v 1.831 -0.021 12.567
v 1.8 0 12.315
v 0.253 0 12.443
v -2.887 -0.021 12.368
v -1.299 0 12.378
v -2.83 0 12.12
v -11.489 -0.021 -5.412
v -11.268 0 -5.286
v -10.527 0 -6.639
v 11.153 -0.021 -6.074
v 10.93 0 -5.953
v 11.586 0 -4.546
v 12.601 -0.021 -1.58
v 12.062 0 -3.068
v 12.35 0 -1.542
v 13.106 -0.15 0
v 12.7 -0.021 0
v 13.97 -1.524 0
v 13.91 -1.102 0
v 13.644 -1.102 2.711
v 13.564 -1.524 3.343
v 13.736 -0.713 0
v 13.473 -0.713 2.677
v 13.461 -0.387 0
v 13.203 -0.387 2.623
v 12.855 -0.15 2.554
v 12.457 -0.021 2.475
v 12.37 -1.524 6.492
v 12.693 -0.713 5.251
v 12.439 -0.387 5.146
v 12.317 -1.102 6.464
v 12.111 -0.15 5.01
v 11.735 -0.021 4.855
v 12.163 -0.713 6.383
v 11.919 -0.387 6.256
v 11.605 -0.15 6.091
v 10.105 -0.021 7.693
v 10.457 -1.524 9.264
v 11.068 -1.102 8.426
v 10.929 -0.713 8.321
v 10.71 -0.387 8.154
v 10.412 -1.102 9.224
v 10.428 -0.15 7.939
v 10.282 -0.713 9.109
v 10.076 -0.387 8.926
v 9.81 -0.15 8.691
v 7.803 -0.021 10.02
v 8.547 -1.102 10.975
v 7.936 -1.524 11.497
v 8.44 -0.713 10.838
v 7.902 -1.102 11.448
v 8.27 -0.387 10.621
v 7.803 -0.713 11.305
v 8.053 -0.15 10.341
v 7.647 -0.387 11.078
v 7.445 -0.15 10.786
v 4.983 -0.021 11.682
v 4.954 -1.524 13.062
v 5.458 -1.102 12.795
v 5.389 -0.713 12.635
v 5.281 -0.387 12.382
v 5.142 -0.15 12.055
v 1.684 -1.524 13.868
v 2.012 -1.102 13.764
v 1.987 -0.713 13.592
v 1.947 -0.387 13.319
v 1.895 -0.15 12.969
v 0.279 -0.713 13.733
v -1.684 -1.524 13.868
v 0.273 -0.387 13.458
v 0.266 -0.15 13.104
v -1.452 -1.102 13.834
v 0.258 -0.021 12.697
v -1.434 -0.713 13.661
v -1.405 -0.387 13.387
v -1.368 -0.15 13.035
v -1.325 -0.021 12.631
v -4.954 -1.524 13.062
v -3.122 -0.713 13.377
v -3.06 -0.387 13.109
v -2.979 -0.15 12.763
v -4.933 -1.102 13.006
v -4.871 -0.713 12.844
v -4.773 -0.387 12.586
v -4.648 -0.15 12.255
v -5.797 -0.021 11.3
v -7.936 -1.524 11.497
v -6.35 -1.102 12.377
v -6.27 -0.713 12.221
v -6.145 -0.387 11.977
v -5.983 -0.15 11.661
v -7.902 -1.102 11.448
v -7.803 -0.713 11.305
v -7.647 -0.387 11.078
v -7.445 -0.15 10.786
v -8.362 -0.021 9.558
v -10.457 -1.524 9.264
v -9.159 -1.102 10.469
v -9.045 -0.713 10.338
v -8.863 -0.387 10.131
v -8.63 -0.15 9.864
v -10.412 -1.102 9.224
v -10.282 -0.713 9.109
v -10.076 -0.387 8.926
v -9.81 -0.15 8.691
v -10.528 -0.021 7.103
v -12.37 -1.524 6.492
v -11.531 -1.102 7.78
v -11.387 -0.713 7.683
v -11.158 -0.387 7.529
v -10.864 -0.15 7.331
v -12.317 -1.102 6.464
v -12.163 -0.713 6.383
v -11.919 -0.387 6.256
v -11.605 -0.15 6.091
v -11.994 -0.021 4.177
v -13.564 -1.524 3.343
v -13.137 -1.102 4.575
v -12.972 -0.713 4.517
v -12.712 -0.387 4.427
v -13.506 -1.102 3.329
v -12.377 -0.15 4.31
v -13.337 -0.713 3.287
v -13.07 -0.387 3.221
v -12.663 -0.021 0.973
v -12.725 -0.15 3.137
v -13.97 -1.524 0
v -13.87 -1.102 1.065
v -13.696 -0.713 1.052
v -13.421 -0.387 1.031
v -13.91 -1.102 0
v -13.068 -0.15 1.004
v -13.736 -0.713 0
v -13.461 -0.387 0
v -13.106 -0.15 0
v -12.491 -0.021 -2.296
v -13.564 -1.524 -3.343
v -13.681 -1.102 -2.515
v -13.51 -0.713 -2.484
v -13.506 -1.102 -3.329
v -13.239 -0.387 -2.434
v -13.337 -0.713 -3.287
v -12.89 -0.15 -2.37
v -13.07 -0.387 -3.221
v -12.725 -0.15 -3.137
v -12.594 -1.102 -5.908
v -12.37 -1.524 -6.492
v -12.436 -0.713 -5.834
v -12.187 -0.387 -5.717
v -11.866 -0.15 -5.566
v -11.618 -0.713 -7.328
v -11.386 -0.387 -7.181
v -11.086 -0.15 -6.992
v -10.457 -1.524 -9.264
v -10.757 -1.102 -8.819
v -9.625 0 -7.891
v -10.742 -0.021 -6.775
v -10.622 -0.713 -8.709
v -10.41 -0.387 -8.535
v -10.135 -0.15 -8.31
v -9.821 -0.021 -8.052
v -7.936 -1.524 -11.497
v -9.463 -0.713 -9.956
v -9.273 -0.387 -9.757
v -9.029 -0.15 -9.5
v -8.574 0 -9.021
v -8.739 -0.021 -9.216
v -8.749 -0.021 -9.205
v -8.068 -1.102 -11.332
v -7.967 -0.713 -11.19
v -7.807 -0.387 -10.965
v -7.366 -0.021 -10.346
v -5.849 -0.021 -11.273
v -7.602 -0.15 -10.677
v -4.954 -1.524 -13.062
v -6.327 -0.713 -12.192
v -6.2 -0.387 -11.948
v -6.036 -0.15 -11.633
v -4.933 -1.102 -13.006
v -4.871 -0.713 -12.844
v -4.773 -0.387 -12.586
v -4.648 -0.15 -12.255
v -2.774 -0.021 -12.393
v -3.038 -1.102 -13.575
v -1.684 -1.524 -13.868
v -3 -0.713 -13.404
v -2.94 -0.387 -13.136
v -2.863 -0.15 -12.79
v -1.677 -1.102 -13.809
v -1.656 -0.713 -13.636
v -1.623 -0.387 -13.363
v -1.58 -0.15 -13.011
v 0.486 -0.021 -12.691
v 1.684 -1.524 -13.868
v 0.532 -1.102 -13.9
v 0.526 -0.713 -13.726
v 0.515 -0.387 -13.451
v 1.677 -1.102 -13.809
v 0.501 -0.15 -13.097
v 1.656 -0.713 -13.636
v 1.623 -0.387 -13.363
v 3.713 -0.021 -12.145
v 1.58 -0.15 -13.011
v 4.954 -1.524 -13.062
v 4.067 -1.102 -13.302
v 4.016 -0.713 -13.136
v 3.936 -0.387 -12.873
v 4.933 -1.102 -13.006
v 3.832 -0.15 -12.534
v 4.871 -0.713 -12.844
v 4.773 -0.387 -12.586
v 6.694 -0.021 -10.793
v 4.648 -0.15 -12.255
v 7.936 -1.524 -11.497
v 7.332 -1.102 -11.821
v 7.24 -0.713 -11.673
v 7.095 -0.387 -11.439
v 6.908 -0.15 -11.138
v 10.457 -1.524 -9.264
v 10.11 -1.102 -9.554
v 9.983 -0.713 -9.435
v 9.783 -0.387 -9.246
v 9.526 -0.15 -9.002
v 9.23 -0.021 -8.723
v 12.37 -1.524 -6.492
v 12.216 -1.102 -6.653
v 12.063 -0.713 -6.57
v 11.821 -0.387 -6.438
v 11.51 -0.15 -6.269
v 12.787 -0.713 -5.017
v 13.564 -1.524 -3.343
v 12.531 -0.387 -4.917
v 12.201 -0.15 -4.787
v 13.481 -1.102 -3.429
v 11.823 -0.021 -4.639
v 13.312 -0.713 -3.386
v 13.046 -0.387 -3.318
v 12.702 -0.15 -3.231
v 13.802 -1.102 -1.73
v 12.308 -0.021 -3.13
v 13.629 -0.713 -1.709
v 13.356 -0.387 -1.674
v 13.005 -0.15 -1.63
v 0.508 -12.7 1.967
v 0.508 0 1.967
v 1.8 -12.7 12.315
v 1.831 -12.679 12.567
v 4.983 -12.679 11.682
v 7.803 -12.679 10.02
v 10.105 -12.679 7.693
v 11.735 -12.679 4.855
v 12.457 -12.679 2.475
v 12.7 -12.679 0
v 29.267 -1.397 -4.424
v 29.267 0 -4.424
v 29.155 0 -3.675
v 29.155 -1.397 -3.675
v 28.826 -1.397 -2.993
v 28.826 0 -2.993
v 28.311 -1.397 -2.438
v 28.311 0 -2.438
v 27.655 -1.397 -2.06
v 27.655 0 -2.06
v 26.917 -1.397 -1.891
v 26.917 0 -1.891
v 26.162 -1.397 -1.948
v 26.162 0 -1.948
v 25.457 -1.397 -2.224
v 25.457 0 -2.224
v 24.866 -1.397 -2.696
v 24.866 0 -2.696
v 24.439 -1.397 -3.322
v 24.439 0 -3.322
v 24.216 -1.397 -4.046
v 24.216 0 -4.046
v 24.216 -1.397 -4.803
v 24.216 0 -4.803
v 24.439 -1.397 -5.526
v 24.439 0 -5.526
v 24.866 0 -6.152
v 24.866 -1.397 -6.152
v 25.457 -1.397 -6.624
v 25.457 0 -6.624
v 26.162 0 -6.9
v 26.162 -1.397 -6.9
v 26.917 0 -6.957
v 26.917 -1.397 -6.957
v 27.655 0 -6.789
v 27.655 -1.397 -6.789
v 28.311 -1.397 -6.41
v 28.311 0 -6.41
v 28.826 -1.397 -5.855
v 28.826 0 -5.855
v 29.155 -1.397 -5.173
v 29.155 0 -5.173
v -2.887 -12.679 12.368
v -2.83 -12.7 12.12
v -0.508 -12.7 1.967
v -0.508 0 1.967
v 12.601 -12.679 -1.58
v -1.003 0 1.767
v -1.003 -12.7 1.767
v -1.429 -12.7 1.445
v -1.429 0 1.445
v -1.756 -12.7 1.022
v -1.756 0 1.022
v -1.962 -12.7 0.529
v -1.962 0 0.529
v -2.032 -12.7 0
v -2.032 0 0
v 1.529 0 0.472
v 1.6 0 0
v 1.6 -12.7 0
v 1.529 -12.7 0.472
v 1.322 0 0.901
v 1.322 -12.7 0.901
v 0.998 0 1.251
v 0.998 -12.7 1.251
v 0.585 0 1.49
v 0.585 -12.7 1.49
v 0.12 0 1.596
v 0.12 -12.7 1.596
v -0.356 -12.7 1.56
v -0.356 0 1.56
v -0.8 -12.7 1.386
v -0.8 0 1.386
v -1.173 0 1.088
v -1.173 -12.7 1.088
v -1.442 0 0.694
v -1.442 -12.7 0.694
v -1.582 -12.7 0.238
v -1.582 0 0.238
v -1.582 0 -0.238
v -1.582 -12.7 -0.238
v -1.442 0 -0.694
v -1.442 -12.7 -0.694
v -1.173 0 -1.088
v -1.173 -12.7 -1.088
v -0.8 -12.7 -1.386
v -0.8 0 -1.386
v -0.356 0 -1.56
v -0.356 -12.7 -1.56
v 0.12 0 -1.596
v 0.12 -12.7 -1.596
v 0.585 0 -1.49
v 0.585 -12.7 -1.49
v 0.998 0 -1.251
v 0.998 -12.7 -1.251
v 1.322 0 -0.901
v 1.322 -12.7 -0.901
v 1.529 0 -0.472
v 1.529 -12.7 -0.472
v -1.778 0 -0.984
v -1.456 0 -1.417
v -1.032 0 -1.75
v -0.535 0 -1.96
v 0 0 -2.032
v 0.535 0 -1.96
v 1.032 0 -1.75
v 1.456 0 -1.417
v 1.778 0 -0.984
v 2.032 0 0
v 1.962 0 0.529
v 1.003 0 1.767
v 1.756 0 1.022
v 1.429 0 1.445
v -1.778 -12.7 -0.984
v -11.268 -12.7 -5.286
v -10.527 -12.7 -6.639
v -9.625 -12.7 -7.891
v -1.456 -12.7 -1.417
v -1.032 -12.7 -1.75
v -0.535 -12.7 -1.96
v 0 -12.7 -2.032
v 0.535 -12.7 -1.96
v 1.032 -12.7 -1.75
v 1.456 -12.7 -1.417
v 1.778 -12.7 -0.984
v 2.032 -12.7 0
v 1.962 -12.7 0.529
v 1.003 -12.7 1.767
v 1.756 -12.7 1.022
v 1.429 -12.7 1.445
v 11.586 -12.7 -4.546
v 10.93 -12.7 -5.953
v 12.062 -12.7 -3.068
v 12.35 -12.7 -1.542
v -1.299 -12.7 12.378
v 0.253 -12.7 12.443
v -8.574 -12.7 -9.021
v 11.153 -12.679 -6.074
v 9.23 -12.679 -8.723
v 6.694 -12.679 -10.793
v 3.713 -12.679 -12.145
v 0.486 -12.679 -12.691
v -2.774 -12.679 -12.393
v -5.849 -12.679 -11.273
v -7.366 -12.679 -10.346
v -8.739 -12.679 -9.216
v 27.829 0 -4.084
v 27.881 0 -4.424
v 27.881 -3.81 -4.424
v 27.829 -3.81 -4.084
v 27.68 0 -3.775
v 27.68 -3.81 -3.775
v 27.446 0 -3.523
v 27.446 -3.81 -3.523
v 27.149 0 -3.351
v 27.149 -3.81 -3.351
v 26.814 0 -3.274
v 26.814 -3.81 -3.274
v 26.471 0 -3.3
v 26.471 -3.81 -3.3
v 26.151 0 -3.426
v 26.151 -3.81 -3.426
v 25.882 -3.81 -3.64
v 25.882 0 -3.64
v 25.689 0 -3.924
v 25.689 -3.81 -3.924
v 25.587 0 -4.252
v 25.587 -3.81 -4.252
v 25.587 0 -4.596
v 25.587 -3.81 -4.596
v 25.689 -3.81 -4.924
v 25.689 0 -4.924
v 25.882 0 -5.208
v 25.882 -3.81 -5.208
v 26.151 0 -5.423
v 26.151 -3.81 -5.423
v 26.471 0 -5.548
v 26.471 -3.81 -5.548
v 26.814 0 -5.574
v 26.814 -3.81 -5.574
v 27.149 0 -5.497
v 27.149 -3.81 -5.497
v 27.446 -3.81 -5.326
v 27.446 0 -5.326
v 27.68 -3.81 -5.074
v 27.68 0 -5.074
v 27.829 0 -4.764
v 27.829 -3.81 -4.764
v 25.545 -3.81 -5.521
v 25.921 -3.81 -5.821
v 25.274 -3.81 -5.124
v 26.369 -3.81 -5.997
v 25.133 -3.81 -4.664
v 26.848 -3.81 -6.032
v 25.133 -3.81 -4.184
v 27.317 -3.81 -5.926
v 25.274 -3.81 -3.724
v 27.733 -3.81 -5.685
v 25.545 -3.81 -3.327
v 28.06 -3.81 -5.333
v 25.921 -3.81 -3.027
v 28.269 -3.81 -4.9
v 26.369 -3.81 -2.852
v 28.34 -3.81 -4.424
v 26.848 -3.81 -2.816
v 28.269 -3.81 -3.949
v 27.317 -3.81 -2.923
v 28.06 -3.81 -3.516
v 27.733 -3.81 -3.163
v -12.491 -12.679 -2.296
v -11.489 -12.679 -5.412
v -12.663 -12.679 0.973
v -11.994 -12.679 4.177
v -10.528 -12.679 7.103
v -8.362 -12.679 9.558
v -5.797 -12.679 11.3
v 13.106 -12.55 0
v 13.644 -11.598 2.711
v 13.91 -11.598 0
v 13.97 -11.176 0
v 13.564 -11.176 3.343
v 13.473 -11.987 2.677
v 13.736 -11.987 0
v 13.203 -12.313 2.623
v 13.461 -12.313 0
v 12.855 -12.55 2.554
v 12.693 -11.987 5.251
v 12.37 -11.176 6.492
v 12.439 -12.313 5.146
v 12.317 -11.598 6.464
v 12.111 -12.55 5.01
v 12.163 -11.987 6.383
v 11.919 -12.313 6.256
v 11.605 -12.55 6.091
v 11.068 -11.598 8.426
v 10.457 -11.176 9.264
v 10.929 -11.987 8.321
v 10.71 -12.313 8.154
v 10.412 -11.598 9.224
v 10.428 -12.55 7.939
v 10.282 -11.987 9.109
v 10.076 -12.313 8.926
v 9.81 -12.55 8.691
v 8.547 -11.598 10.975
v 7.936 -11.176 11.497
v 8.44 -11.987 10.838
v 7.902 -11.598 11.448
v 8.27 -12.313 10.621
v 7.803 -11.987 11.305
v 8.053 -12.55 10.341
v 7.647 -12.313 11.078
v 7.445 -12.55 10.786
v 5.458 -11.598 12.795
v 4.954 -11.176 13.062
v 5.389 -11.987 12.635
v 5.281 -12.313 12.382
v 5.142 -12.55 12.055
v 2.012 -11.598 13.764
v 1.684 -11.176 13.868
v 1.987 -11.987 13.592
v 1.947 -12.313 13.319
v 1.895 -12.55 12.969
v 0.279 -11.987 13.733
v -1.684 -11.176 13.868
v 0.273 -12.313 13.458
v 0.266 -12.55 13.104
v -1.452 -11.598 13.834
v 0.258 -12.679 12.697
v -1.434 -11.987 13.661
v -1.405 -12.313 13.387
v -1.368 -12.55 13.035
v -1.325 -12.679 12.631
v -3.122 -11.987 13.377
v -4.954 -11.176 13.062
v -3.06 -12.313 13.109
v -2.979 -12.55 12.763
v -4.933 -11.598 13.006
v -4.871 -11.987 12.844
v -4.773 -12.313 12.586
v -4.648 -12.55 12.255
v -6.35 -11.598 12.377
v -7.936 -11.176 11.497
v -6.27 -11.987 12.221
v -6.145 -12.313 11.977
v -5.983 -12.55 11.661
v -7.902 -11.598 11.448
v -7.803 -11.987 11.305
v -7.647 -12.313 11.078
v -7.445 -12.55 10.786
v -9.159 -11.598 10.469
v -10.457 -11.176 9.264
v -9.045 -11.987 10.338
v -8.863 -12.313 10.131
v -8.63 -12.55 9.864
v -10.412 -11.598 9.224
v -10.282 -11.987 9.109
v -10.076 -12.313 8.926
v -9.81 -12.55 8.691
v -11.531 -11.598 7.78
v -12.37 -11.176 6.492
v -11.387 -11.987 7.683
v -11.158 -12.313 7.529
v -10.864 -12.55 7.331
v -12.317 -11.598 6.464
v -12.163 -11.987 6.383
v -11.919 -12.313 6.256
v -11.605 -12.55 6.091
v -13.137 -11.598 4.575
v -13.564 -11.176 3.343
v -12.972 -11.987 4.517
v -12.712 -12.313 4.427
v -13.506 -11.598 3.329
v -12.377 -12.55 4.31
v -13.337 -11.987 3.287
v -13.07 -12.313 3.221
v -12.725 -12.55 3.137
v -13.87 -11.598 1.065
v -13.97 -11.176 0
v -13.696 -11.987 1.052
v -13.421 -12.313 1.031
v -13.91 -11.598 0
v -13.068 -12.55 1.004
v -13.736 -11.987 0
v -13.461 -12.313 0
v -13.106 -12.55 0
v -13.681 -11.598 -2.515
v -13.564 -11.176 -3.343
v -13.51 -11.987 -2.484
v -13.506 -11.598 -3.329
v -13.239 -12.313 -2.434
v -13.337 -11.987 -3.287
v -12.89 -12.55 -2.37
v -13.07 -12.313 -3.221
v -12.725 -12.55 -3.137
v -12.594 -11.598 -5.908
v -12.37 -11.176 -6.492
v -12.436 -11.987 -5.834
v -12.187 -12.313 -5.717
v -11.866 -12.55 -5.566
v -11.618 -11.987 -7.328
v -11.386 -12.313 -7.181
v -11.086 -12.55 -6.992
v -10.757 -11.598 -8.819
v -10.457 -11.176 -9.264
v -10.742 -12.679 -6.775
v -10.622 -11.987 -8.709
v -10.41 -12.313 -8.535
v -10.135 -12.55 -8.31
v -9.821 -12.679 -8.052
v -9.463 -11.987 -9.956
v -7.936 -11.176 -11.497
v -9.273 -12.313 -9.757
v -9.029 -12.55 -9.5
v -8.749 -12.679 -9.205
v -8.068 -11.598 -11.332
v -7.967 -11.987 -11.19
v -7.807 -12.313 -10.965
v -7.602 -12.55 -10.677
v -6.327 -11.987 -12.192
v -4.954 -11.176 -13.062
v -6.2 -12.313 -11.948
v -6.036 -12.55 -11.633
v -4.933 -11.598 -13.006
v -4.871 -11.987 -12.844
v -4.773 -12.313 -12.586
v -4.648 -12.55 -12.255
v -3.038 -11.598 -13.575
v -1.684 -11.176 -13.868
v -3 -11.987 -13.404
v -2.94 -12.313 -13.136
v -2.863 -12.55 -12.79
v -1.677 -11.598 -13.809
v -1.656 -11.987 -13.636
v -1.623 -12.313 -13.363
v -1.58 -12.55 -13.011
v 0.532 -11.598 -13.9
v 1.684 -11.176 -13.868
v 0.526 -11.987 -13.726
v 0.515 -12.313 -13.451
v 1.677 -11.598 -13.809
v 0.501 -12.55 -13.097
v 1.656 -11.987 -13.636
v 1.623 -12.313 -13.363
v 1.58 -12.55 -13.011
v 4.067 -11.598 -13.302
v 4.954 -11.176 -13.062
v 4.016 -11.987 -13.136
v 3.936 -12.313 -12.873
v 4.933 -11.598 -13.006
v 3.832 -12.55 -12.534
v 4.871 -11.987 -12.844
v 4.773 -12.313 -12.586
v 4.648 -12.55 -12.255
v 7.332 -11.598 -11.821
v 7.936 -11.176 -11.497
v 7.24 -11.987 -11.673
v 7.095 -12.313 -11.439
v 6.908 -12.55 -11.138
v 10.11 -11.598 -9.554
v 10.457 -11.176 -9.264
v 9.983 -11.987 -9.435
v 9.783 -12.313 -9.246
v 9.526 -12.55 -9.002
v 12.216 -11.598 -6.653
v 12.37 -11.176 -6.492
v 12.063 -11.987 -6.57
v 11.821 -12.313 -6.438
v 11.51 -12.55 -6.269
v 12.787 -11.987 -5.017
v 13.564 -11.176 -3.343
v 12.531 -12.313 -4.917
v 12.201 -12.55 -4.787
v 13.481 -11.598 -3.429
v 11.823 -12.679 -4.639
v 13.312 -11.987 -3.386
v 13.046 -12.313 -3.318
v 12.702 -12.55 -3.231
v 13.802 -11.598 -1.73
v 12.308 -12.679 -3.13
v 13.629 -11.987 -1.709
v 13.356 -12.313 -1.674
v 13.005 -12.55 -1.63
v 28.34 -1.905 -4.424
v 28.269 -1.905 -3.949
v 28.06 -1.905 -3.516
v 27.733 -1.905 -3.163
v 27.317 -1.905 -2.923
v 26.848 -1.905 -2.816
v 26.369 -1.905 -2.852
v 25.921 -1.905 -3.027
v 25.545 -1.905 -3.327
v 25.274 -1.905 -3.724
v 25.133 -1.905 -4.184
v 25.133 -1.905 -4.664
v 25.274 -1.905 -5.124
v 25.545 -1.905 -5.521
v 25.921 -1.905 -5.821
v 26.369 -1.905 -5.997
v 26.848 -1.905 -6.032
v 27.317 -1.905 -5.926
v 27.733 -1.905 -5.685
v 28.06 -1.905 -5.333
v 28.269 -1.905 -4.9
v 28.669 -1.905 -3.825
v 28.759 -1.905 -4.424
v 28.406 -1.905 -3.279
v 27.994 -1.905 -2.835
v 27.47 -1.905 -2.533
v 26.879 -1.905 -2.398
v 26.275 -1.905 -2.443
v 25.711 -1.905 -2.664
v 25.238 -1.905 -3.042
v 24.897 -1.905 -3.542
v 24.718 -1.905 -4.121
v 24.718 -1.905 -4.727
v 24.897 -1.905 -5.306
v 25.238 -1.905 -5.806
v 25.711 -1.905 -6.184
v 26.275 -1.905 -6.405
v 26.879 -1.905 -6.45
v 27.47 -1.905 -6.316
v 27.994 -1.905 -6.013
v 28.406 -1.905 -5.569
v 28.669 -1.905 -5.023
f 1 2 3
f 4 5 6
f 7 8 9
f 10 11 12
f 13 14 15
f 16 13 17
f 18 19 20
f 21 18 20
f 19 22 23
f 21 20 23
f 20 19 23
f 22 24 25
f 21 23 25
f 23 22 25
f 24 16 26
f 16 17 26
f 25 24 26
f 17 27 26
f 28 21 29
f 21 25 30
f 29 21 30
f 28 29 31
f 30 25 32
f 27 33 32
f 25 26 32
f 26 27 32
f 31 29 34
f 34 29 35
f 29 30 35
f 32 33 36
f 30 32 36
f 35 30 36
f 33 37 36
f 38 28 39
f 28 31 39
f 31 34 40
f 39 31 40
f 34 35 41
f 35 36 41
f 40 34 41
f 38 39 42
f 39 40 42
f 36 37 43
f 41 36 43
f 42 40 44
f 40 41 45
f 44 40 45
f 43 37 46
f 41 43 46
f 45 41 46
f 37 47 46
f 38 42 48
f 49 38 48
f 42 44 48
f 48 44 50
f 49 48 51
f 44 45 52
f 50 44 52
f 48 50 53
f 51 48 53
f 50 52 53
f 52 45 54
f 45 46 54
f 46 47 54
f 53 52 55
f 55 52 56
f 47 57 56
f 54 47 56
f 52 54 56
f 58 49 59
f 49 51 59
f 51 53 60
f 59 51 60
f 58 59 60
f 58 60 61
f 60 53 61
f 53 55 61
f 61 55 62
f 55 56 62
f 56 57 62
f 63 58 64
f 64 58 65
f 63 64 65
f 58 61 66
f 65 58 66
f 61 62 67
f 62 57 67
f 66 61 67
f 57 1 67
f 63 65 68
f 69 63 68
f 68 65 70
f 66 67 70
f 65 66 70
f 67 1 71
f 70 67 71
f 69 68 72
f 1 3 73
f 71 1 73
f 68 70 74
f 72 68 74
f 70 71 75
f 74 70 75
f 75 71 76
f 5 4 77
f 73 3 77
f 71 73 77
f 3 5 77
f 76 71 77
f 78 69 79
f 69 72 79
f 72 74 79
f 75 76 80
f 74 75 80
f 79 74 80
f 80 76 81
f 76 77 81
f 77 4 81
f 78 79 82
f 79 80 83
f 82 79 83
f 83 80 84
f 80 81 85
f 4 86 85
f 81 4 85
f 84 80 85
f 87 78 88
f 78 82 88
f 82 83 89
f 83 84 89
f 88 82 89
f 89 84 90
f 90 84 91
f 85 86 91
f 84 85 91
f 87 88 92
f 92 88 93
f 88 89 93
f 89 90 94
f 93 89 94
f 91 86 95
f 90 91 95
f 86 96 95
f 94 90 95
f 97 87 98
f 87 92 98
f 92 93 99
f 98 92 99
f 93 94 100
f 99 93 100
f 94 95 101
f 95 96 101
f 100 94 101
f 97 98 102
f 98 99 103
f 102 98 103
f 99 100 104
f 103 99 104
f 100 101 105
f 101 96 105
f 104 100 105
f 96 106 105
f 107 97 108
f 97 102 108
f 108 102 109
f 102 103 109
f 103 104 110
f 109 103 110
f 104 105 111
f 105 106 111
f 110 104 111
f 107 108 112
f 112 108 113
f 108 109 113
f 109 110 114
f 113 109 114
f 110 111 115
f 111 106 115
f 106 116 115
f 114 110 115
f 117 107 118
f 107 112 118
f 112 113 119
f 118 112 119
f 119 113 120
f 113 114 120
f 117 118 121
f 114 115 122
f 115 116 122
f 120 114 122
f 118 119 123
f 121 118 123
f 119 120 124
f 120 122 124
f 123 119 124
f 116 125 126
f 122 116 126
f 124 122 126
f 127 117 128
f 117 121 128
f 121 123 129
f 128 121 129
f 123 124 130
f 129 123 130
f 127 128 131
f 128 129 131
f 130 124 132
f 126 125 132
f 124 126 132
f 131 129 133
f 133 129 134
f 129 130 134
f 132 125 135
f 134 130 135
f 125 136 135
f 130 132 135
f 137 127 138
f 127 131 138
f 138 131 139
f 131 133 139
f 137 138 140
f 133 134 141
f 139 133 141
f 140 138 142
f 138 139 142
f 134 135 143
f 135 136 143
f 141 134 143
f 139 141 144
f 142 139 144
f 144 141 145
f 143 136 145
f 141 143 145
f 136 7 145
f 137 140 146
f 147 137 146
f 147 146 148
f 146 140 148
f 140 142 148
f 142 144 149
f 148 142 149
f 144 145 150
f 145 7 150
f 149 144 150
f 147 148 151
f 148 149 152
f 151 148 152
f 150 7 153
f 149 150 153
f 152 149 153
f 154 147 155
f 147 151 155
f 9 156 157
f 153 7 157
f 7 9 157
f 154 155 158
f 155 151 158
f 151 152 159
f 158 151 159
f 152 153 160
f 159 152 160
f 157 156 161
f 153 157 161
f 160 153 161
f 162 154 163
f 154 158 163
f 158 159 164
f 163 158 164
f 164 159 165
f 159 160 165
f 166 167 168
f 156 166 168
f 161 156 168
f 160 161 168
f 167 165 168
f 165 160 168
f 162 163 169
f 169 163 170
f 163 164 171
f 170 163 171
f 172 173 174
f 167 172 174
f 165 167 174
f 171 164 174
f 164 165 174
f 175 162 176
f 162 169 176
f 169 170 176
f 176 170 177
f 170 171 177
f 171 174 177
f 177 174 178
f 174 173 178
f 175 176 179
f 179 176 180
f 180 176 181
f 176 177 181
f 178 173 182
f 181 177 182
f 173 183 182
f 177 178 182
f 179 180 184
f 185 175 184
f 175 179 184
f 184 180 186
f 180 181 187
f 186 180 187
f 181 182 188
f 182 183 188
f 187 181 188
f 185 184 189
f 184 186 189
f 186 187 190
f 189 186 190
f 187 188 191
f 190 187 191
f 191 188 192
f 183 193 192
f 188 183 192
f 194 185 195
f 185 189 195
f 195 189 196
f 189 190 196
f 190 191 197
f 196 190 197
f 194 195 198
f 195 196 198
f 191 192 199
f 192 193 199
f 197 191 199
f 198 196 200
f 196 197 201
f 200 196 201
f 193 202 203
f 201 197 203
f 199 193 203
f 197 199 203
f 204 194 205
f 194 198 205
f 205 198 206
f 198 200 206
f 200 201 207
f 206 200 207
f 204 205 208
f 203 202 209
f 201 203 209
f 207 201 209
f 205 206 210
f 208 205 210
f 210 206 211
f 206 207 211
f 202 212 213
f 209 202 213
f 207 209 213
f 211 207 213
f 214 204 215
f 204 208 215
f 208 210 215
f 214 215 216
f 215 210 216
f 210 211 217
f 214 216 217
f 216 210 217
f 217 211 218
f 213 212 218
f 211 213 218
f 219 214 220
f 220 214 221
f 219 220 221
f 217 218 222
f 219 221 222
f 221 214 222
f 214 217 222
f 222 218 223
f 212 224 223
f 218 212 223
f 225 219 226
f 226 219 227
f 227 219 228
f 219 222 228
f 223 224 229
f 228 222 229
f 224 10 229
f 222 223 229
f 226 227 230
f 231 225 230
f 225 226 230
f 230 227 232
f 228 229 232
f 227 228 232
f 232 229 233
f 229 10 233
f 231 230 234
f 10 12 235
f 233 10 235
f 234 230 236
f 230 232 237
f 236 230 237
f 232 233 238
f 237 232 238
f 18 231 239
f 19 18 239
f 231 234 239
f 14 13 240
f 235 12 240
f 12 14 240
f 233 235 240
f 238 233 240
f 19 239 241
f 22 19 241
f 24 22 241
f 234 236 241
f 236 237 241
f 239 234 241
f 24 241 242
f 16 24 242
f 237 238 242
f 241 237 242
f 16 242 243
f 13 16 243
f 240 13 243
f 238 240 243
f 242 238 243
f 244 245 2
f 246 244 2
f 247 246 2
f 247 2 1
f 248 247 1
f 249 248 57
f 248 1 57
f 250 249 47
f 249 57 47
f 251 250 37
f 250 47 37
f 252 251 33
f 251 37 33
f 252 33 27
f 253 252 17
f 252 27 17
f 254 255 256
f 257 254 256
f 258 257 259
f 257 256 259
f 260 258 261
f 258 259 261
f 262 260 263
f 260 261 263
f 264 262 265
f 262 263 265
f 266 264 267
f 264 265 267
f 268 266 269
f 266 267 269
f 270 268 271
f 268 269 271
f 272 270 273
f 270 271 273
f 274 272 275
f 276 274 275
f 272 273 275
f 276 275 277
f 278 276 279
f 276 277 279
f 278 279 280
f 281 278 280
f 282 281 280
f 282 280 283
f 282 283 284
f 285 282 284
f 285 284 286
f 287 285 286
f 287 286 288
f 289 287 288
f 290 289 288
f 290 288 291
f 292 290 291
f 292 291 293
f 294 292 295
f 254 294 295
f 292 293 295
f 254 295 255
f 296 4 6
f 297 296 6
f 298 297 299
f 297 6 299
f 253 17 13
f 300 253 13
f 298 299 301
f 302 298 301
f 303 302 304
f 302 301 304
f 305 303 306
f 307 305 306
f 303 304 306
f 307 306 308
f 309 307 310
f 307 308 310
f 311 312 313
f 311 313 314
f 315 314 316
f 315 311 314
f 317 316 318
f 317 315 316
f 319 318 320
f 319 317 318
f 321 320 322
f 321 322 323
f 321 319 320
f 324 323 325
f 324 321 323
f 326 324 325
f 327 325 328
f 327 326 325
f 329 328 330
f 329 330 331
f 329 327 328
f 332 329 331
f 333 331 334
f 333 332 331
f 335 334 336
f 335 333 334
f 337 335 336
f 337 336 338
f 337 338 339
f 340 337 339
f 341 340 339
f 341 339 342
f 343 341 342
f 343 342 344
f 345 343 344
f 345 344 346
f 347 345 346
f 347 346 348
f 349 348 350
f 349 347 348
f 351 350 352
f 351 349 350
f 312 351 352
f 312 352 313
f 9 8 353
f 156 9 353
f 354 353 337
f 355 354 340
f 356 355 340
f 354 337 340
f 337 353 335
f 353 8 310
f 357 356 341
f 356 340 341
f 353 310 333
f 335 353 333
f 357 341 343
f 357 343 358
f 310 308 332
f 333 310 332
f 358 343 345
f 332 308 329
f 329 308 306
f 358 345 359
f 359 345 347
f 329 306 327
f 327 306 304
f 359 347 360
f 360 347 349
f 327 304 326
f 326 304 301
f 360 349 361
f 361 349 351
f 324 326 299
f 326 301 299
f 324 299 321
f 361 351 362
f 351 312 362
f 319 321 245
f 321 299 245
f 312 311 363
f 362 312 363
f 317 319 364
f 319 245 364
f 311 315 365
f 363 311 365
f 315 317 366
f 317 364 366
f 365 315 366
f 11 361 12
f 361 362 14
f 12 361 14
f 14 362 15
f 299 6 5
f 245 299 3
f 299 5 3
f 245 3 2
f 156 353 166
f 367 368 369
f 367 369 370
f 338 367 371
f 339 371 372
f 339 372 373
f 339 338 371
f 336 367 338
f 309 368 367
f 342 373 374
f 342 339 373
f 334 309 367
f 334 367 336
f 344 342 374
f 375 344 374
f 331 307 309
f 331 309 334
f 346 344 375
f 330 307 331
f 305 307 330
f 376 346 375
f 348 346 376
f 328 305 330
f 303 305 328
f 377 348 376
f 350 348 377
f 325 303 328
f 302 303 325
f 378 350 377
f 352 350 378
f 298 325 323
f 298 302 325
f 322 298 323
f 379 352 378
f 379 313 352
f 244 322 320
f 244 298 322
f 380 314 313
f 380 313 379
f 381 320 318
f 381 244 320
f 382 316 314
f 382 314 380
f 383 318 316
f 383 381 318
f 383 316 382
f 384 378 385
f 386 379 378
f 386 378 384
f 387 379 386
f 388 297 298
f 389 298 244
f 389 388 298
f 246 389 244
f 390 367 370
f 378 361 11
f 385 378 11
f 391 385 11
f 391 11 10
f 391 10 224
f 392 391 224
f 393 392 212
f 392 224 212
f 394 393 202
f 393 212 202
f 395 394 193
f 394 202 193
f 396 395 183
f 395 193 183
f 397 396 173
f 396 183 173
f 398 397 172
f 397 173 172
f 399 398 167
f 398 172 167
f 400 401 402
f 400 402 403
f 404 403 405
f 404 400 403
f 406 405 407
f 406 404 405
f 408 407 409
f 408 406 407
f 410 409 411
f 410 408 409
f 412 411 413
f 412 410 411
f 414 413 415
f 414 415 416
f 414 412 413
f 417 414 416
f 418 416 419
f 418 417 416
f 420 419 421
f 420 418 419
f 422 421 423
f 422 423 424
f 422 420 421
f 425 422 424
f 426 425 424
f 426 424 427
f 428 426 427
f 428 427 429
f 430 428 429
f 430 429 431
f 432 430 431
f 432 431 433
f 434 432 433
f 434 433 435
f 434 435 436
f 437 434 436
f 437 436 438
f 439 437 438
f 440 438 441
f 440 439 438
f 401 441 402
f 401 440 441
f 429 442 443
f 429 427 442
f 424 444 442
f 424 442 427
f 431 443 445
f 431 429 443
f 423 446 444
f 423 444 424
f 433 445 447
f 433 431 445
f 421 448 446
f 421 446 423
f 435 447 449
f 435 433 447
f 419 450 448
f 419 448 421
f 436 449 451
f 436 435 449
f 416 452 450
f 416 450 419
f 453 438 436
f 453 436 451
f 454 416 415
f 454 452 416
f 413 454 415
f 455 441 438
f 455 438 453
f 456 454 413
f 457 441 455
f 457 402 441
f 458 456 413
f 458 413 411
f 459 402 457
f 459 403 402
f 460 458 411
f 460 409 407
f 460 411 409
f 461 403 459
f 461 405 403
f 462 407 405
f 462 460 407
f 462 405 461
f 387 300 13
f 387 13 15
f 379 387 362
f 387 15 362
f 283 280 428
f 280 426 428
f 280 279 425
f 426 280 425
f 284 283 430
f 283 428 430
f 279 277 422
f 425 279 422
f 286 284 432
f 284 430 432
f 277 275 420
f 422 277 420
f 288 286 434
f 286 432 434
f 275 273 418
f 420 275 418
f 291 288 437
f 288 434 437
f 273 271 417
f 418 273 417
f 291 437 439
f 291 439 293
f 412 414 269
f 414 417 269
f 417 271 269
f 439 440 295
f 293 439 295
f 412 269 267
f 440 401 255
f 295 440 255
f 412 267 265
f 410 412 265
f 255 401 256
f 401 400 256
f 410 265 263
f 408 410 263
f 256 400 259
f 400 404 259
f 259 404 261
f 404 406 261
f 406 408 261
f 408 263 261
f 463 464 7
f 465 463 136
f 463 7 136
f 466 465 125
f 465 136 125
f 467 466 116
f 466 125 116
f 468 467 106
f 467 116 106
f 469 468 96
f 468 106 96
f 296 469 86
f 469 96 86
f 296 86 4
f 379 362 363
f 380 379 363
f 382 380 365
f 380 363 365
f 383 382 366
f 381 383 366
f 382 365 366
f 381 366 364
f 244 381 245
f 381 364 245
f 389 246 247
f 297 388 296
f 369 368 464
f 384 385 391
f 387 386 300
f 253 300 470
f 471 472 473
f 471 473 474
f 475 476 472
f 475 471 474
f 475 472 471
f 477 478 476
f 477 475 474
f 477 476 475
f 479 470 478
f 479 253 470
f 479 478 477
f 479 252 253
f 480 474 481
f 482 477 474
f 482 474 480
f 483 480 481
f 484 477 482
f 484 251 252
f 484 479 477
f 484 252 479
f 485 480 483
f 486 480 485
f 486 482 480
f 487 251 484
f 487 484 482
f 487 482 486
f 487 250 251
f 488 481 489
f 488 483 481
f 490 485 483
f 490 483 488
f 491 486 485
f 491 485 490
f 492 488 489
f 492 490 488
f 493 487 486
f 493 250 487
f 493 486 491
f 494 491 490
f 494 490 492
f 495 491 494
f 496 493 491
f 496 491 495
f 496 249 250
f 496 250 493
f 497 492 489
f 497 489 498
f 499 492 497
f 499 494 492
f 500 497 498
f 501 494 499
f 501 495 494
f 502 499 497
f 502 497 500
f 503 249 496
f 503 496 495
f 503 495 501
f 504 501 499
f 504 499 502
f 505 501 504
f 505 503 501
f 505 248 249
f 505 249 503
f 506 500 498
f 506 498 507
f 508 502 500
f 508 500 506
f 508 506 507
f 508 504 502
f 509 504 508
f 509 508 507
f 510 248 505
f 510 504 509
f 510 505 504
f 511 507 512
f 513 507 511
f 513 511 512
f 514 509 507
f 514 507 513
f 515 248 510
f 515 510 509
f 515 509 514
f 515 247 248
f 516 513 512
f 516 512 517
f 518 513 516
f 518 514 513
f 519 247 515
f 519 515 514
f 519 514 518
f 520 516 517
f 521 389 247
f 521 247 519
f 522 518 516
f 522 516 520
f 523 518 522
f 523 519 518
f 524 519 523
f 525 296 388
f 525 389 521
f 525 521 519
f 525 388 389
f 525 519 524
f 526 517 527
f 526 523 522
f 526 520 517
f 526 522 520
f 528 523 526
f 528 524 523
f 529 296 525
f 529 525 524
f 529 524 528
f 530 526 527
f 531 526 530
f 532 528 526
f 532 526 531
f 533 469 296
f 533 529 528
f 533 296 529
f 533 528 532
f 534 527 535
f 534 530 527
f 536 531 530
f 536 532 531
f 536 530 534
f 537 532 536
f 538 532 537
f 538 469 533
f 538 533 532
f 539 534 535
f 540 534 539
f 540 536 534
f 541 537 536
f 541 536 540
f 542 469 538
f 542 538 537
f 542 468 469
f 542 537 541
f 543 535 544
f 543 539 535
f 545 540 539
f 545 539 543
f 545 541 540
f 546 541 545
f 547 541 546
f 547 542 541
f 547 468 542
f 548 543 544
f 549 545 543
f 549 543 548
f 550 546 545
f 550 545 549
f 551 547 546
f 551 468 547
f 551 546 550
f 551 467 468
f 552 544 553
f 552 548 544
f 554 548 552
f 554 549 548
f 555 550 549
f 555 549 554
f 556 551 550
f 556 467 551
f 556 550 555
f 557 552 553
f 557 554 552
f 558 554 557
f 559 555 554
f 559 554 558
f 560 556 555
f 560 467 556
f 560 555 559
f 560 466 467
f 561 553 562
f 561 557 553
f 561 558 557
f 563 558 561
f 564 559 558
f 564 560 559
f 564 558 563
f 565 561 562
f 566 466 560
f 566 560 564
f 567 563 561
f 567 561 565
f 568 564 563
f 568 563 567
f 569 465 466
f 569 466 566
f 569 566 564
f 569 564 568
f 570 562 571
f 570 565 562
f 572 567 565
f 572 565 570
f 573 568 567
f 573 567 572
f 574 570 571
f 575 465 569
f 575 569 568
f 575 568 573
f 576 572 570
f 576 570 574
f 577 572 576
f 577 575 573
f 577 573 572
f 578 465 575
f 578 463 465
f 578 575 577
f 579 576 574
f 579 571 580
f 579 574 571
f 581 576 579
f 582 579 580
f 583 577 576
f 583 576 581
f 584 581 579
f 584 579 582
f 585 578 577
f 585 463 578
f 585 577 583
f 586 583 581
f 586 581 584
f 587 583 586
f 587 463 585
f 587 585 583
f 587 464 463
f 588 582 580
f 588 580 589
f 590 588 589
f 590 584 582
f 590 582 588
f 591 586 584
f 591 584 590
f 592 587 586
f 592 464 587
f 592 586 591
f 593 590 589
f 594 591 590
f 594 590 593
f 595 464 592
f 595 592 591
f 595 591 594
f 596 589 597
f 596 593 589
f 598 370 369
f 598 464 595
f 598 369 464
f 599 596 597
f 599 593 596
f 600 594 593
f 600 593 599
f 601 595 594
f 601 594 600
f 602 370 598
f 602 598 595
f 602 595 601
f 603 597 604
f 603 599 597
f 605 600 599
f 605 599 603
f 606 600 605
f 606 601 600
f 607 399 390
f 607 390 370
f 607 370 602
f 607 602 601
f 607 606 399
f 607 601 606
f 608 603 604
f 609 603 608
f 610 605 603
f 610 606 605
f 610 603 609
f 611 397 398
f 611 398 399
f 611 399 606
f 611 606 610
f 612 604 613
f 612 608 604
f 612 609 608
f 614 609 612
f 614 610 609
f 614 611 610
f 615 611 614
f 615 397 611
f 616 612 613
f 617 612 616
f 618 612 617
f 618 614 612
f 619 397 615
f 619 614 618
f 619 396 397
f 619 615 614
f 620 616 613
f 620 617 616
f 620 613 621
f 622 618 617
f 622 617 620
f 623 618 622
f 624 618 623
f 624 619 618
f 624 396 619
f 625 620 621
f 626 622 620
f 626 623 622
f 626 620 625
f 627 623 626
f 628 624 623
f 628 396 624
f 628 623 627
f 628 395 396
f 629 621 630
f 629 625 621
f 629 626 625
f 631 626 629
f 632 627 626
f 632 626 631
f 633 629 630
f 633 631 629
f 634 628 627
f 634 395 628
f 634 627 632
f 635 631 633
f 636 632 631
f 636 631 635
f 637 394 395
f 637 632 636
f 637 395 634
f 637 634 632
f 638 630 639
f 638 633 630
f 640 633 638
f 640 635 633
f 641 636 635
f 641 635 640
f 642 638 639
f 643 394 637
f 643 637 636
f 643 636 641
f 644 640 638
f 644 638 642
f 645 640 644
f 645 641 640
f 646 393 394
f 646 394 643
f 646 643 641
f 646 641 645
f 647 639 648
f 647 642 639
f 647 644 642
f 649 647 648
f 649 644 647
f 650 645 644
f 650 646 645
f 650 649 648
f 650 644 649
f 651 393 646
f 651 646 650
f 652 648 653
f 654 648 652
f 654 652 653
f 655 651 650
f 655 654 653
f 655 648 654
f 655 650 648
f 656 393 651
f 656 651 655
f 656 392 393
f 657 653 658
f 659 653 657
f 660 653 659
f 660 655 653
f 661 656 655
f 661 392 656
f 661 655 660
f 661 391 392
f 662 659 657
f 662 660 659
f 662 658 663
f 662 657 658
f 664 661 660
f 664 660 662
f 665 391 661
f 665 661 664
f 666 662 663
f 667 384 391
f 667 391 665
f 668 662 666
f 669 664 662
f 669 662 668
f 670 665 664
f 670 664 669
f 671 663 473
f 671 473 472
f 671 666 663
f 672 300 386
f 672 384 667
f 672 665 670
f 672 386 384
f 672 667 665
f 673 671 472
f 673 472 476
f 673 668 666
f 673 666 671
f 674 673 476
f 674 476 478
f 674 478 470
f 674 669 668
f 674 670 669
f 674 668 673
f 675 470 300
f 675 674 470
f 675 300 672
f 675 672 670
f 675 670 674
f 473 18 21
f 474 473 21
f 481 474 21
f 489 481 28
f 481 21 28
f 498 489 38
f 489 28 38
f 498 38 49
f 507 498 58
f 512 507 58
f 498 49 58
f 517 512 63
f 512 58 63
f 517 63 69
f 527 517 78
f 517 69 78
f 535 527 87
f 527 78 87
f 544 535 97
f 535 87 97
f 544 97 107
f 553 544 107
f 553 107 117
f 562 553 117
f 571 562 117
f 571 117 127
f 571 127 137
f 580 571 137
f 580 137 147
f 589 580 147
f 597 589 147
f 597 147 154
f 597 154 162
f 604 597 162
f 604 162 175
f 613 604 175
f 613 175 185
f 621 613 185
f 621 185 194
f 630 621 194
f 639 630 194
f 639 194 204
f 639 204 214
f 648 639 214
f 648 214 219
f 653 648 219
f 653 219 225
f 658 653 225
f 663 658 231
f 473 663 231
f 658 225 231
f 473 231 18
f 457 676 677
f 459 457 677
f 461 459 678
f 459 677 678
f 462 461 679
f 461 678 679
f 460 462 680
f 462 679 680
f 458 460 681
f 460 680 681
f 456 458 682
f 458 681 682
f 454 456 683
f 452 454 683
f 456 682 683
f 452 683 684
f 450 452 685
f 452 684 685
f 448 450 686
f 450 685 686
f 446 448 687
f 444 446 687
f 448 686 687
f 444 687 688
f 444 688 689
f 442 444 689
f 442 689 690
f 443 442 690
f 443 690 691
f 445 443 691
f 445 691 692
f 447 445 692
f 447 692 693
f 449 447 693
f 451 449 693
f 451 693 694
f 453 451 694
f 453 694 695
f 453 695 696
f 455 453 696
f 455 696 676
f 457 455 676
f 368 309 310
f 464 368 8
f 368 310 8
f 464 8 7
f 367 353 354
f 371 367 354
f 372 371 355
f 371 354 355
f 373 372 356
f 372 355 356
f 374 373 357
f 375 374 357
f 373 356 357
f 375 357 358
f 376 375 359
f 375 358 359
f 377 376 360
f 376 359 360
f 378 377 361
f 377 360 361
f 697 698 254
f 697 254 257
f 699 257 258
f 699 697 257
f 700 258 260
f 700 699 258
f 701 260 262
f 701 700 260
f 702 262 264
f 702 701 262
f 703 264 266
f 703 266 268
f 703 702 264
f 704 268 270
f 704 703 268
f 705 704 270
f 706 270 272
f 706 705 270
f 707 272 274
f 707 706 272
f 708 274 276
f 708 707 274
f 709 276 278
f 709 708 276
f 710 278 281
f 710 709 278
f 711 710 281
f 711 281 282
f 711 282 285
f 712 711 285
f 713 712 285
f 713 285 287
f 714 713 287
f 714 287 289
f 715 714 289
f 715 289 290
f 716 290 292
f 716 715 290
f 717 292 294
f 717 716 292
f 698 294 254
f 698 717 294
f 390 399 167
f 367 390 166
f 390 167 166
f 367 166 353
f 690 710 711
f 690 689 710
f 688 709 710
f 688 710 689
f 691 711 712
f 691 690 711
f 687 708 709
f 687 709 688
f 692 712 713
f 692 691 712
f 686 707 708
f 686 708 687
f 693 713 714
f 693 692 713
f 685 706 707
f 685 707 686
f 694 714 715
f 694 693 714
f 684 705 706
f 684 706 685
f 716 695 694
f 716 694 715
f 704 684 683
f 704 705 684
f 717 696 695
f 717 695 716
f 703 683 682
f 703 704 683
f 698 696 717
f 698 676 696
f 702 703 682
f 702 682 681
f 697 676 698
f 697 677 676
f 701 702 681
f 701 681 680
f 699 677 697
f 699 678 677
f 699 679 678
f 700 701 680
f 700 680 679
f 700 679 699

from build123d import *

# Parameters (mm, degrees)
F0_R     = 13.97
F0_R_2   = 1.6002
F1_DEPTH = 12.7
F3_R     = 1.6129
F3_R_2   = 1.1530042691
F4_DEPTH = 3.81
F3_R_3   = 2.54
F5_DEPTH = 1.905
F6_SIZE  = 0.508


# Not quite as in the source:
# - a fillet or chamfer that OpenCascade refuses, or shapes differently, is made with other operations: its cross-section is extruded or revolved along the edge and cut away or added


with BuildPart() as f1:
    # F0 (on Front) → F1 (new body)
    with BuildSketch(Plane.XZ):
        Circle(F0_R)
        with BuildLine():
            ThreePointArc((12.7, 0), (12.6753175523, -0.7914069427), (12.6013661498, -1.5797376868))
            ThreePointArc((12.6013661498, -1.5797376868), (12.0880096107, -3.894871455), (11.1532043579, -6.0742104466))
            ThreePointArc((11.1532043579, -6.0742104466), (1.9811025721, -12.5445299872), (-8.7385473465, -9.215627503))
            ThreePointArc((-8.7385473465, -9.215627503), (-10.2909600249, -7.4421866253), (-11.4889360845, -5.4124253016))
            ThreePointArc((-11.4889360845, -5.4124253016), (-11.4322745724, 5.5311027925), (-2.8867102521, 12.3675746984))
            ThreePointArc((-2.8867102521, 12.3675746984), (-0.5369932074, 12.6886420982), (1.8314490307, 12.5672508707))
            ThreePointArc((1.8314490307, 12.5672508707), (9.6059721707, 8.3075446827), (12.7, 0))
        make_face(mode=Mode.SUBTRACT)
        with BuildLine():
            ThreePointArc((1.778, -0.9837377699), (1.9674755399, -0.508), (2.032, 0))
            ThreePointArc((2.032, 0), (1.6064370514, 1.2443407893), (0.508, 1.9674755399))
            ThreePointArc((0.508, 1.9674755399), (0, 2.032), (-0.508, 1.9674755399))
            ThreePointArc((-0.508, 1.9674755399), (-1.6064370514, 1.2443407893), (-2.032, 0))
            ThreePointArc((-2.032, 0), (-1.9674755399, -0.508), (-1.778, -0.9837377699))
            ThreePointArc((-1.778, -0.9837377699), (0, -2.032), (1.778, -0.9837377699))
        make_face()
        Circle(F0_R_2, mode=Mode.SUBTRACT)
        with BuildLine():
            Line((-8.7385473465, -9.215627503), (-1.778, -0.9837377699))
            ThreePointArc((-1.778, -0.9837377699), (-1.9674755399, -0.508), (-2.032, 0))
            Line((-2.032, 0), (-11.4889360845, -5.4124253016))
            ThreePointArc((-11.4889360845, -5.4124253016), (-10.2909600249, -7.4421866253), (-8.7385473465, -9.215627503))
        make_face()
        with BuildLine():
            Line((12.6013661498, -1.5797376868), (2.032, 0))
            ThreePointArc((2.032, 0), (1.9674755399, -0.508), (1.778, -0.9837377699))
            Line((1.778, -0.9837377699), (11.1532043579, -6.0742104466))
            ThreePointArc((11.1532043579, -6.0742104466), (12.0880096107, -3.894871455), (12.6013661498, -1.5797376868))
        make_face()
        with BuildLine():
            ThreePointArc((-0.508, 1.9674755399), (0, 2.032), (0.508, 1.9674755399))
            Line((0.508, 1.9674755399), (1.8314490307, 12.5672508707))
            ThreePointArc((1.8314490307, 12.5672508707), (-0.5369932074, 12.6886420982), (-2.8867102521, 12.3675746984))
            Line((-2.8867102521, 12.3675746984), (-0.508, 1.9674755399))
        make_face()
    extrude(amount=F1_DEPTH)

    # F2: fillet of radius 1.524 on 2 edges, made by hand

    # F2_s1 → F2_t2 (revolve, cut)
    with BuildSketch(Plane.XY):
        with BuildLine():
            ThreePointArc((13.97, -11.176), (13.5236307345, -12.2536307345), (12.446, -12.7))
            Line((12.446, -12.7), (13.97, -12.7))
            Line((13.97, -12.7), (13.97, -11.176))
        make_face()
    revolve(axis=Axis((0, -12.7, 0), (0, -1, 0)), mode=Mode.SUBTRACT)

    # F2_s3 → F2_t4 (revolve, cut)
    with BuildSketch(Plane.XY):
        with BuildLine():
            ThreePointArc((13.97, -1.524), (13.5236307345, -0.4463692655), (12.446, 0))
            Line((12.446, 0), (13.97, 0))
            Line((13.97, 0), (13.97, -1.524))
        make_face()
    revolve(axis=Axis((0, 0, 0), (0, -1, 0)), mode=Mode.SUBTRACT)


with BuildPart() as f4:
    # F3 (on Front) → F4 (new body)
    with BuildSketch(Plane.XZ):
        with Locations((26.7274966631, -4.4241022947)):
            Circle(F3_R)
        with Locations((26.7274966631, -4.4241022947)):
            Circle(F3_R_2, mode=Mode.SUBTRACT)
    extrude(amount=F4_DEPTH)

    # F3 (on Front) → F5 (join)
    with BuildSketch(Plane.XZ):
        with Locations((26.7274966631, -4.4241022947)):
            Circle(F3_R_3)
        with Locations((26.7274966631, -4.4241022947)):
            Circle(F3_R, mode=Mode.SUBTRACT)
    extrude(amount=F5_DEPTH)

    # F6
    f6_edges = [f4.edges().sort_by_distance(p)[0] for p in [
        (24.187497, -1.905, -4.424102),
    ]]
    chamfer(f6_edges, length=F6_SIZE)


solid = Compound([f1.part, f4.part])
